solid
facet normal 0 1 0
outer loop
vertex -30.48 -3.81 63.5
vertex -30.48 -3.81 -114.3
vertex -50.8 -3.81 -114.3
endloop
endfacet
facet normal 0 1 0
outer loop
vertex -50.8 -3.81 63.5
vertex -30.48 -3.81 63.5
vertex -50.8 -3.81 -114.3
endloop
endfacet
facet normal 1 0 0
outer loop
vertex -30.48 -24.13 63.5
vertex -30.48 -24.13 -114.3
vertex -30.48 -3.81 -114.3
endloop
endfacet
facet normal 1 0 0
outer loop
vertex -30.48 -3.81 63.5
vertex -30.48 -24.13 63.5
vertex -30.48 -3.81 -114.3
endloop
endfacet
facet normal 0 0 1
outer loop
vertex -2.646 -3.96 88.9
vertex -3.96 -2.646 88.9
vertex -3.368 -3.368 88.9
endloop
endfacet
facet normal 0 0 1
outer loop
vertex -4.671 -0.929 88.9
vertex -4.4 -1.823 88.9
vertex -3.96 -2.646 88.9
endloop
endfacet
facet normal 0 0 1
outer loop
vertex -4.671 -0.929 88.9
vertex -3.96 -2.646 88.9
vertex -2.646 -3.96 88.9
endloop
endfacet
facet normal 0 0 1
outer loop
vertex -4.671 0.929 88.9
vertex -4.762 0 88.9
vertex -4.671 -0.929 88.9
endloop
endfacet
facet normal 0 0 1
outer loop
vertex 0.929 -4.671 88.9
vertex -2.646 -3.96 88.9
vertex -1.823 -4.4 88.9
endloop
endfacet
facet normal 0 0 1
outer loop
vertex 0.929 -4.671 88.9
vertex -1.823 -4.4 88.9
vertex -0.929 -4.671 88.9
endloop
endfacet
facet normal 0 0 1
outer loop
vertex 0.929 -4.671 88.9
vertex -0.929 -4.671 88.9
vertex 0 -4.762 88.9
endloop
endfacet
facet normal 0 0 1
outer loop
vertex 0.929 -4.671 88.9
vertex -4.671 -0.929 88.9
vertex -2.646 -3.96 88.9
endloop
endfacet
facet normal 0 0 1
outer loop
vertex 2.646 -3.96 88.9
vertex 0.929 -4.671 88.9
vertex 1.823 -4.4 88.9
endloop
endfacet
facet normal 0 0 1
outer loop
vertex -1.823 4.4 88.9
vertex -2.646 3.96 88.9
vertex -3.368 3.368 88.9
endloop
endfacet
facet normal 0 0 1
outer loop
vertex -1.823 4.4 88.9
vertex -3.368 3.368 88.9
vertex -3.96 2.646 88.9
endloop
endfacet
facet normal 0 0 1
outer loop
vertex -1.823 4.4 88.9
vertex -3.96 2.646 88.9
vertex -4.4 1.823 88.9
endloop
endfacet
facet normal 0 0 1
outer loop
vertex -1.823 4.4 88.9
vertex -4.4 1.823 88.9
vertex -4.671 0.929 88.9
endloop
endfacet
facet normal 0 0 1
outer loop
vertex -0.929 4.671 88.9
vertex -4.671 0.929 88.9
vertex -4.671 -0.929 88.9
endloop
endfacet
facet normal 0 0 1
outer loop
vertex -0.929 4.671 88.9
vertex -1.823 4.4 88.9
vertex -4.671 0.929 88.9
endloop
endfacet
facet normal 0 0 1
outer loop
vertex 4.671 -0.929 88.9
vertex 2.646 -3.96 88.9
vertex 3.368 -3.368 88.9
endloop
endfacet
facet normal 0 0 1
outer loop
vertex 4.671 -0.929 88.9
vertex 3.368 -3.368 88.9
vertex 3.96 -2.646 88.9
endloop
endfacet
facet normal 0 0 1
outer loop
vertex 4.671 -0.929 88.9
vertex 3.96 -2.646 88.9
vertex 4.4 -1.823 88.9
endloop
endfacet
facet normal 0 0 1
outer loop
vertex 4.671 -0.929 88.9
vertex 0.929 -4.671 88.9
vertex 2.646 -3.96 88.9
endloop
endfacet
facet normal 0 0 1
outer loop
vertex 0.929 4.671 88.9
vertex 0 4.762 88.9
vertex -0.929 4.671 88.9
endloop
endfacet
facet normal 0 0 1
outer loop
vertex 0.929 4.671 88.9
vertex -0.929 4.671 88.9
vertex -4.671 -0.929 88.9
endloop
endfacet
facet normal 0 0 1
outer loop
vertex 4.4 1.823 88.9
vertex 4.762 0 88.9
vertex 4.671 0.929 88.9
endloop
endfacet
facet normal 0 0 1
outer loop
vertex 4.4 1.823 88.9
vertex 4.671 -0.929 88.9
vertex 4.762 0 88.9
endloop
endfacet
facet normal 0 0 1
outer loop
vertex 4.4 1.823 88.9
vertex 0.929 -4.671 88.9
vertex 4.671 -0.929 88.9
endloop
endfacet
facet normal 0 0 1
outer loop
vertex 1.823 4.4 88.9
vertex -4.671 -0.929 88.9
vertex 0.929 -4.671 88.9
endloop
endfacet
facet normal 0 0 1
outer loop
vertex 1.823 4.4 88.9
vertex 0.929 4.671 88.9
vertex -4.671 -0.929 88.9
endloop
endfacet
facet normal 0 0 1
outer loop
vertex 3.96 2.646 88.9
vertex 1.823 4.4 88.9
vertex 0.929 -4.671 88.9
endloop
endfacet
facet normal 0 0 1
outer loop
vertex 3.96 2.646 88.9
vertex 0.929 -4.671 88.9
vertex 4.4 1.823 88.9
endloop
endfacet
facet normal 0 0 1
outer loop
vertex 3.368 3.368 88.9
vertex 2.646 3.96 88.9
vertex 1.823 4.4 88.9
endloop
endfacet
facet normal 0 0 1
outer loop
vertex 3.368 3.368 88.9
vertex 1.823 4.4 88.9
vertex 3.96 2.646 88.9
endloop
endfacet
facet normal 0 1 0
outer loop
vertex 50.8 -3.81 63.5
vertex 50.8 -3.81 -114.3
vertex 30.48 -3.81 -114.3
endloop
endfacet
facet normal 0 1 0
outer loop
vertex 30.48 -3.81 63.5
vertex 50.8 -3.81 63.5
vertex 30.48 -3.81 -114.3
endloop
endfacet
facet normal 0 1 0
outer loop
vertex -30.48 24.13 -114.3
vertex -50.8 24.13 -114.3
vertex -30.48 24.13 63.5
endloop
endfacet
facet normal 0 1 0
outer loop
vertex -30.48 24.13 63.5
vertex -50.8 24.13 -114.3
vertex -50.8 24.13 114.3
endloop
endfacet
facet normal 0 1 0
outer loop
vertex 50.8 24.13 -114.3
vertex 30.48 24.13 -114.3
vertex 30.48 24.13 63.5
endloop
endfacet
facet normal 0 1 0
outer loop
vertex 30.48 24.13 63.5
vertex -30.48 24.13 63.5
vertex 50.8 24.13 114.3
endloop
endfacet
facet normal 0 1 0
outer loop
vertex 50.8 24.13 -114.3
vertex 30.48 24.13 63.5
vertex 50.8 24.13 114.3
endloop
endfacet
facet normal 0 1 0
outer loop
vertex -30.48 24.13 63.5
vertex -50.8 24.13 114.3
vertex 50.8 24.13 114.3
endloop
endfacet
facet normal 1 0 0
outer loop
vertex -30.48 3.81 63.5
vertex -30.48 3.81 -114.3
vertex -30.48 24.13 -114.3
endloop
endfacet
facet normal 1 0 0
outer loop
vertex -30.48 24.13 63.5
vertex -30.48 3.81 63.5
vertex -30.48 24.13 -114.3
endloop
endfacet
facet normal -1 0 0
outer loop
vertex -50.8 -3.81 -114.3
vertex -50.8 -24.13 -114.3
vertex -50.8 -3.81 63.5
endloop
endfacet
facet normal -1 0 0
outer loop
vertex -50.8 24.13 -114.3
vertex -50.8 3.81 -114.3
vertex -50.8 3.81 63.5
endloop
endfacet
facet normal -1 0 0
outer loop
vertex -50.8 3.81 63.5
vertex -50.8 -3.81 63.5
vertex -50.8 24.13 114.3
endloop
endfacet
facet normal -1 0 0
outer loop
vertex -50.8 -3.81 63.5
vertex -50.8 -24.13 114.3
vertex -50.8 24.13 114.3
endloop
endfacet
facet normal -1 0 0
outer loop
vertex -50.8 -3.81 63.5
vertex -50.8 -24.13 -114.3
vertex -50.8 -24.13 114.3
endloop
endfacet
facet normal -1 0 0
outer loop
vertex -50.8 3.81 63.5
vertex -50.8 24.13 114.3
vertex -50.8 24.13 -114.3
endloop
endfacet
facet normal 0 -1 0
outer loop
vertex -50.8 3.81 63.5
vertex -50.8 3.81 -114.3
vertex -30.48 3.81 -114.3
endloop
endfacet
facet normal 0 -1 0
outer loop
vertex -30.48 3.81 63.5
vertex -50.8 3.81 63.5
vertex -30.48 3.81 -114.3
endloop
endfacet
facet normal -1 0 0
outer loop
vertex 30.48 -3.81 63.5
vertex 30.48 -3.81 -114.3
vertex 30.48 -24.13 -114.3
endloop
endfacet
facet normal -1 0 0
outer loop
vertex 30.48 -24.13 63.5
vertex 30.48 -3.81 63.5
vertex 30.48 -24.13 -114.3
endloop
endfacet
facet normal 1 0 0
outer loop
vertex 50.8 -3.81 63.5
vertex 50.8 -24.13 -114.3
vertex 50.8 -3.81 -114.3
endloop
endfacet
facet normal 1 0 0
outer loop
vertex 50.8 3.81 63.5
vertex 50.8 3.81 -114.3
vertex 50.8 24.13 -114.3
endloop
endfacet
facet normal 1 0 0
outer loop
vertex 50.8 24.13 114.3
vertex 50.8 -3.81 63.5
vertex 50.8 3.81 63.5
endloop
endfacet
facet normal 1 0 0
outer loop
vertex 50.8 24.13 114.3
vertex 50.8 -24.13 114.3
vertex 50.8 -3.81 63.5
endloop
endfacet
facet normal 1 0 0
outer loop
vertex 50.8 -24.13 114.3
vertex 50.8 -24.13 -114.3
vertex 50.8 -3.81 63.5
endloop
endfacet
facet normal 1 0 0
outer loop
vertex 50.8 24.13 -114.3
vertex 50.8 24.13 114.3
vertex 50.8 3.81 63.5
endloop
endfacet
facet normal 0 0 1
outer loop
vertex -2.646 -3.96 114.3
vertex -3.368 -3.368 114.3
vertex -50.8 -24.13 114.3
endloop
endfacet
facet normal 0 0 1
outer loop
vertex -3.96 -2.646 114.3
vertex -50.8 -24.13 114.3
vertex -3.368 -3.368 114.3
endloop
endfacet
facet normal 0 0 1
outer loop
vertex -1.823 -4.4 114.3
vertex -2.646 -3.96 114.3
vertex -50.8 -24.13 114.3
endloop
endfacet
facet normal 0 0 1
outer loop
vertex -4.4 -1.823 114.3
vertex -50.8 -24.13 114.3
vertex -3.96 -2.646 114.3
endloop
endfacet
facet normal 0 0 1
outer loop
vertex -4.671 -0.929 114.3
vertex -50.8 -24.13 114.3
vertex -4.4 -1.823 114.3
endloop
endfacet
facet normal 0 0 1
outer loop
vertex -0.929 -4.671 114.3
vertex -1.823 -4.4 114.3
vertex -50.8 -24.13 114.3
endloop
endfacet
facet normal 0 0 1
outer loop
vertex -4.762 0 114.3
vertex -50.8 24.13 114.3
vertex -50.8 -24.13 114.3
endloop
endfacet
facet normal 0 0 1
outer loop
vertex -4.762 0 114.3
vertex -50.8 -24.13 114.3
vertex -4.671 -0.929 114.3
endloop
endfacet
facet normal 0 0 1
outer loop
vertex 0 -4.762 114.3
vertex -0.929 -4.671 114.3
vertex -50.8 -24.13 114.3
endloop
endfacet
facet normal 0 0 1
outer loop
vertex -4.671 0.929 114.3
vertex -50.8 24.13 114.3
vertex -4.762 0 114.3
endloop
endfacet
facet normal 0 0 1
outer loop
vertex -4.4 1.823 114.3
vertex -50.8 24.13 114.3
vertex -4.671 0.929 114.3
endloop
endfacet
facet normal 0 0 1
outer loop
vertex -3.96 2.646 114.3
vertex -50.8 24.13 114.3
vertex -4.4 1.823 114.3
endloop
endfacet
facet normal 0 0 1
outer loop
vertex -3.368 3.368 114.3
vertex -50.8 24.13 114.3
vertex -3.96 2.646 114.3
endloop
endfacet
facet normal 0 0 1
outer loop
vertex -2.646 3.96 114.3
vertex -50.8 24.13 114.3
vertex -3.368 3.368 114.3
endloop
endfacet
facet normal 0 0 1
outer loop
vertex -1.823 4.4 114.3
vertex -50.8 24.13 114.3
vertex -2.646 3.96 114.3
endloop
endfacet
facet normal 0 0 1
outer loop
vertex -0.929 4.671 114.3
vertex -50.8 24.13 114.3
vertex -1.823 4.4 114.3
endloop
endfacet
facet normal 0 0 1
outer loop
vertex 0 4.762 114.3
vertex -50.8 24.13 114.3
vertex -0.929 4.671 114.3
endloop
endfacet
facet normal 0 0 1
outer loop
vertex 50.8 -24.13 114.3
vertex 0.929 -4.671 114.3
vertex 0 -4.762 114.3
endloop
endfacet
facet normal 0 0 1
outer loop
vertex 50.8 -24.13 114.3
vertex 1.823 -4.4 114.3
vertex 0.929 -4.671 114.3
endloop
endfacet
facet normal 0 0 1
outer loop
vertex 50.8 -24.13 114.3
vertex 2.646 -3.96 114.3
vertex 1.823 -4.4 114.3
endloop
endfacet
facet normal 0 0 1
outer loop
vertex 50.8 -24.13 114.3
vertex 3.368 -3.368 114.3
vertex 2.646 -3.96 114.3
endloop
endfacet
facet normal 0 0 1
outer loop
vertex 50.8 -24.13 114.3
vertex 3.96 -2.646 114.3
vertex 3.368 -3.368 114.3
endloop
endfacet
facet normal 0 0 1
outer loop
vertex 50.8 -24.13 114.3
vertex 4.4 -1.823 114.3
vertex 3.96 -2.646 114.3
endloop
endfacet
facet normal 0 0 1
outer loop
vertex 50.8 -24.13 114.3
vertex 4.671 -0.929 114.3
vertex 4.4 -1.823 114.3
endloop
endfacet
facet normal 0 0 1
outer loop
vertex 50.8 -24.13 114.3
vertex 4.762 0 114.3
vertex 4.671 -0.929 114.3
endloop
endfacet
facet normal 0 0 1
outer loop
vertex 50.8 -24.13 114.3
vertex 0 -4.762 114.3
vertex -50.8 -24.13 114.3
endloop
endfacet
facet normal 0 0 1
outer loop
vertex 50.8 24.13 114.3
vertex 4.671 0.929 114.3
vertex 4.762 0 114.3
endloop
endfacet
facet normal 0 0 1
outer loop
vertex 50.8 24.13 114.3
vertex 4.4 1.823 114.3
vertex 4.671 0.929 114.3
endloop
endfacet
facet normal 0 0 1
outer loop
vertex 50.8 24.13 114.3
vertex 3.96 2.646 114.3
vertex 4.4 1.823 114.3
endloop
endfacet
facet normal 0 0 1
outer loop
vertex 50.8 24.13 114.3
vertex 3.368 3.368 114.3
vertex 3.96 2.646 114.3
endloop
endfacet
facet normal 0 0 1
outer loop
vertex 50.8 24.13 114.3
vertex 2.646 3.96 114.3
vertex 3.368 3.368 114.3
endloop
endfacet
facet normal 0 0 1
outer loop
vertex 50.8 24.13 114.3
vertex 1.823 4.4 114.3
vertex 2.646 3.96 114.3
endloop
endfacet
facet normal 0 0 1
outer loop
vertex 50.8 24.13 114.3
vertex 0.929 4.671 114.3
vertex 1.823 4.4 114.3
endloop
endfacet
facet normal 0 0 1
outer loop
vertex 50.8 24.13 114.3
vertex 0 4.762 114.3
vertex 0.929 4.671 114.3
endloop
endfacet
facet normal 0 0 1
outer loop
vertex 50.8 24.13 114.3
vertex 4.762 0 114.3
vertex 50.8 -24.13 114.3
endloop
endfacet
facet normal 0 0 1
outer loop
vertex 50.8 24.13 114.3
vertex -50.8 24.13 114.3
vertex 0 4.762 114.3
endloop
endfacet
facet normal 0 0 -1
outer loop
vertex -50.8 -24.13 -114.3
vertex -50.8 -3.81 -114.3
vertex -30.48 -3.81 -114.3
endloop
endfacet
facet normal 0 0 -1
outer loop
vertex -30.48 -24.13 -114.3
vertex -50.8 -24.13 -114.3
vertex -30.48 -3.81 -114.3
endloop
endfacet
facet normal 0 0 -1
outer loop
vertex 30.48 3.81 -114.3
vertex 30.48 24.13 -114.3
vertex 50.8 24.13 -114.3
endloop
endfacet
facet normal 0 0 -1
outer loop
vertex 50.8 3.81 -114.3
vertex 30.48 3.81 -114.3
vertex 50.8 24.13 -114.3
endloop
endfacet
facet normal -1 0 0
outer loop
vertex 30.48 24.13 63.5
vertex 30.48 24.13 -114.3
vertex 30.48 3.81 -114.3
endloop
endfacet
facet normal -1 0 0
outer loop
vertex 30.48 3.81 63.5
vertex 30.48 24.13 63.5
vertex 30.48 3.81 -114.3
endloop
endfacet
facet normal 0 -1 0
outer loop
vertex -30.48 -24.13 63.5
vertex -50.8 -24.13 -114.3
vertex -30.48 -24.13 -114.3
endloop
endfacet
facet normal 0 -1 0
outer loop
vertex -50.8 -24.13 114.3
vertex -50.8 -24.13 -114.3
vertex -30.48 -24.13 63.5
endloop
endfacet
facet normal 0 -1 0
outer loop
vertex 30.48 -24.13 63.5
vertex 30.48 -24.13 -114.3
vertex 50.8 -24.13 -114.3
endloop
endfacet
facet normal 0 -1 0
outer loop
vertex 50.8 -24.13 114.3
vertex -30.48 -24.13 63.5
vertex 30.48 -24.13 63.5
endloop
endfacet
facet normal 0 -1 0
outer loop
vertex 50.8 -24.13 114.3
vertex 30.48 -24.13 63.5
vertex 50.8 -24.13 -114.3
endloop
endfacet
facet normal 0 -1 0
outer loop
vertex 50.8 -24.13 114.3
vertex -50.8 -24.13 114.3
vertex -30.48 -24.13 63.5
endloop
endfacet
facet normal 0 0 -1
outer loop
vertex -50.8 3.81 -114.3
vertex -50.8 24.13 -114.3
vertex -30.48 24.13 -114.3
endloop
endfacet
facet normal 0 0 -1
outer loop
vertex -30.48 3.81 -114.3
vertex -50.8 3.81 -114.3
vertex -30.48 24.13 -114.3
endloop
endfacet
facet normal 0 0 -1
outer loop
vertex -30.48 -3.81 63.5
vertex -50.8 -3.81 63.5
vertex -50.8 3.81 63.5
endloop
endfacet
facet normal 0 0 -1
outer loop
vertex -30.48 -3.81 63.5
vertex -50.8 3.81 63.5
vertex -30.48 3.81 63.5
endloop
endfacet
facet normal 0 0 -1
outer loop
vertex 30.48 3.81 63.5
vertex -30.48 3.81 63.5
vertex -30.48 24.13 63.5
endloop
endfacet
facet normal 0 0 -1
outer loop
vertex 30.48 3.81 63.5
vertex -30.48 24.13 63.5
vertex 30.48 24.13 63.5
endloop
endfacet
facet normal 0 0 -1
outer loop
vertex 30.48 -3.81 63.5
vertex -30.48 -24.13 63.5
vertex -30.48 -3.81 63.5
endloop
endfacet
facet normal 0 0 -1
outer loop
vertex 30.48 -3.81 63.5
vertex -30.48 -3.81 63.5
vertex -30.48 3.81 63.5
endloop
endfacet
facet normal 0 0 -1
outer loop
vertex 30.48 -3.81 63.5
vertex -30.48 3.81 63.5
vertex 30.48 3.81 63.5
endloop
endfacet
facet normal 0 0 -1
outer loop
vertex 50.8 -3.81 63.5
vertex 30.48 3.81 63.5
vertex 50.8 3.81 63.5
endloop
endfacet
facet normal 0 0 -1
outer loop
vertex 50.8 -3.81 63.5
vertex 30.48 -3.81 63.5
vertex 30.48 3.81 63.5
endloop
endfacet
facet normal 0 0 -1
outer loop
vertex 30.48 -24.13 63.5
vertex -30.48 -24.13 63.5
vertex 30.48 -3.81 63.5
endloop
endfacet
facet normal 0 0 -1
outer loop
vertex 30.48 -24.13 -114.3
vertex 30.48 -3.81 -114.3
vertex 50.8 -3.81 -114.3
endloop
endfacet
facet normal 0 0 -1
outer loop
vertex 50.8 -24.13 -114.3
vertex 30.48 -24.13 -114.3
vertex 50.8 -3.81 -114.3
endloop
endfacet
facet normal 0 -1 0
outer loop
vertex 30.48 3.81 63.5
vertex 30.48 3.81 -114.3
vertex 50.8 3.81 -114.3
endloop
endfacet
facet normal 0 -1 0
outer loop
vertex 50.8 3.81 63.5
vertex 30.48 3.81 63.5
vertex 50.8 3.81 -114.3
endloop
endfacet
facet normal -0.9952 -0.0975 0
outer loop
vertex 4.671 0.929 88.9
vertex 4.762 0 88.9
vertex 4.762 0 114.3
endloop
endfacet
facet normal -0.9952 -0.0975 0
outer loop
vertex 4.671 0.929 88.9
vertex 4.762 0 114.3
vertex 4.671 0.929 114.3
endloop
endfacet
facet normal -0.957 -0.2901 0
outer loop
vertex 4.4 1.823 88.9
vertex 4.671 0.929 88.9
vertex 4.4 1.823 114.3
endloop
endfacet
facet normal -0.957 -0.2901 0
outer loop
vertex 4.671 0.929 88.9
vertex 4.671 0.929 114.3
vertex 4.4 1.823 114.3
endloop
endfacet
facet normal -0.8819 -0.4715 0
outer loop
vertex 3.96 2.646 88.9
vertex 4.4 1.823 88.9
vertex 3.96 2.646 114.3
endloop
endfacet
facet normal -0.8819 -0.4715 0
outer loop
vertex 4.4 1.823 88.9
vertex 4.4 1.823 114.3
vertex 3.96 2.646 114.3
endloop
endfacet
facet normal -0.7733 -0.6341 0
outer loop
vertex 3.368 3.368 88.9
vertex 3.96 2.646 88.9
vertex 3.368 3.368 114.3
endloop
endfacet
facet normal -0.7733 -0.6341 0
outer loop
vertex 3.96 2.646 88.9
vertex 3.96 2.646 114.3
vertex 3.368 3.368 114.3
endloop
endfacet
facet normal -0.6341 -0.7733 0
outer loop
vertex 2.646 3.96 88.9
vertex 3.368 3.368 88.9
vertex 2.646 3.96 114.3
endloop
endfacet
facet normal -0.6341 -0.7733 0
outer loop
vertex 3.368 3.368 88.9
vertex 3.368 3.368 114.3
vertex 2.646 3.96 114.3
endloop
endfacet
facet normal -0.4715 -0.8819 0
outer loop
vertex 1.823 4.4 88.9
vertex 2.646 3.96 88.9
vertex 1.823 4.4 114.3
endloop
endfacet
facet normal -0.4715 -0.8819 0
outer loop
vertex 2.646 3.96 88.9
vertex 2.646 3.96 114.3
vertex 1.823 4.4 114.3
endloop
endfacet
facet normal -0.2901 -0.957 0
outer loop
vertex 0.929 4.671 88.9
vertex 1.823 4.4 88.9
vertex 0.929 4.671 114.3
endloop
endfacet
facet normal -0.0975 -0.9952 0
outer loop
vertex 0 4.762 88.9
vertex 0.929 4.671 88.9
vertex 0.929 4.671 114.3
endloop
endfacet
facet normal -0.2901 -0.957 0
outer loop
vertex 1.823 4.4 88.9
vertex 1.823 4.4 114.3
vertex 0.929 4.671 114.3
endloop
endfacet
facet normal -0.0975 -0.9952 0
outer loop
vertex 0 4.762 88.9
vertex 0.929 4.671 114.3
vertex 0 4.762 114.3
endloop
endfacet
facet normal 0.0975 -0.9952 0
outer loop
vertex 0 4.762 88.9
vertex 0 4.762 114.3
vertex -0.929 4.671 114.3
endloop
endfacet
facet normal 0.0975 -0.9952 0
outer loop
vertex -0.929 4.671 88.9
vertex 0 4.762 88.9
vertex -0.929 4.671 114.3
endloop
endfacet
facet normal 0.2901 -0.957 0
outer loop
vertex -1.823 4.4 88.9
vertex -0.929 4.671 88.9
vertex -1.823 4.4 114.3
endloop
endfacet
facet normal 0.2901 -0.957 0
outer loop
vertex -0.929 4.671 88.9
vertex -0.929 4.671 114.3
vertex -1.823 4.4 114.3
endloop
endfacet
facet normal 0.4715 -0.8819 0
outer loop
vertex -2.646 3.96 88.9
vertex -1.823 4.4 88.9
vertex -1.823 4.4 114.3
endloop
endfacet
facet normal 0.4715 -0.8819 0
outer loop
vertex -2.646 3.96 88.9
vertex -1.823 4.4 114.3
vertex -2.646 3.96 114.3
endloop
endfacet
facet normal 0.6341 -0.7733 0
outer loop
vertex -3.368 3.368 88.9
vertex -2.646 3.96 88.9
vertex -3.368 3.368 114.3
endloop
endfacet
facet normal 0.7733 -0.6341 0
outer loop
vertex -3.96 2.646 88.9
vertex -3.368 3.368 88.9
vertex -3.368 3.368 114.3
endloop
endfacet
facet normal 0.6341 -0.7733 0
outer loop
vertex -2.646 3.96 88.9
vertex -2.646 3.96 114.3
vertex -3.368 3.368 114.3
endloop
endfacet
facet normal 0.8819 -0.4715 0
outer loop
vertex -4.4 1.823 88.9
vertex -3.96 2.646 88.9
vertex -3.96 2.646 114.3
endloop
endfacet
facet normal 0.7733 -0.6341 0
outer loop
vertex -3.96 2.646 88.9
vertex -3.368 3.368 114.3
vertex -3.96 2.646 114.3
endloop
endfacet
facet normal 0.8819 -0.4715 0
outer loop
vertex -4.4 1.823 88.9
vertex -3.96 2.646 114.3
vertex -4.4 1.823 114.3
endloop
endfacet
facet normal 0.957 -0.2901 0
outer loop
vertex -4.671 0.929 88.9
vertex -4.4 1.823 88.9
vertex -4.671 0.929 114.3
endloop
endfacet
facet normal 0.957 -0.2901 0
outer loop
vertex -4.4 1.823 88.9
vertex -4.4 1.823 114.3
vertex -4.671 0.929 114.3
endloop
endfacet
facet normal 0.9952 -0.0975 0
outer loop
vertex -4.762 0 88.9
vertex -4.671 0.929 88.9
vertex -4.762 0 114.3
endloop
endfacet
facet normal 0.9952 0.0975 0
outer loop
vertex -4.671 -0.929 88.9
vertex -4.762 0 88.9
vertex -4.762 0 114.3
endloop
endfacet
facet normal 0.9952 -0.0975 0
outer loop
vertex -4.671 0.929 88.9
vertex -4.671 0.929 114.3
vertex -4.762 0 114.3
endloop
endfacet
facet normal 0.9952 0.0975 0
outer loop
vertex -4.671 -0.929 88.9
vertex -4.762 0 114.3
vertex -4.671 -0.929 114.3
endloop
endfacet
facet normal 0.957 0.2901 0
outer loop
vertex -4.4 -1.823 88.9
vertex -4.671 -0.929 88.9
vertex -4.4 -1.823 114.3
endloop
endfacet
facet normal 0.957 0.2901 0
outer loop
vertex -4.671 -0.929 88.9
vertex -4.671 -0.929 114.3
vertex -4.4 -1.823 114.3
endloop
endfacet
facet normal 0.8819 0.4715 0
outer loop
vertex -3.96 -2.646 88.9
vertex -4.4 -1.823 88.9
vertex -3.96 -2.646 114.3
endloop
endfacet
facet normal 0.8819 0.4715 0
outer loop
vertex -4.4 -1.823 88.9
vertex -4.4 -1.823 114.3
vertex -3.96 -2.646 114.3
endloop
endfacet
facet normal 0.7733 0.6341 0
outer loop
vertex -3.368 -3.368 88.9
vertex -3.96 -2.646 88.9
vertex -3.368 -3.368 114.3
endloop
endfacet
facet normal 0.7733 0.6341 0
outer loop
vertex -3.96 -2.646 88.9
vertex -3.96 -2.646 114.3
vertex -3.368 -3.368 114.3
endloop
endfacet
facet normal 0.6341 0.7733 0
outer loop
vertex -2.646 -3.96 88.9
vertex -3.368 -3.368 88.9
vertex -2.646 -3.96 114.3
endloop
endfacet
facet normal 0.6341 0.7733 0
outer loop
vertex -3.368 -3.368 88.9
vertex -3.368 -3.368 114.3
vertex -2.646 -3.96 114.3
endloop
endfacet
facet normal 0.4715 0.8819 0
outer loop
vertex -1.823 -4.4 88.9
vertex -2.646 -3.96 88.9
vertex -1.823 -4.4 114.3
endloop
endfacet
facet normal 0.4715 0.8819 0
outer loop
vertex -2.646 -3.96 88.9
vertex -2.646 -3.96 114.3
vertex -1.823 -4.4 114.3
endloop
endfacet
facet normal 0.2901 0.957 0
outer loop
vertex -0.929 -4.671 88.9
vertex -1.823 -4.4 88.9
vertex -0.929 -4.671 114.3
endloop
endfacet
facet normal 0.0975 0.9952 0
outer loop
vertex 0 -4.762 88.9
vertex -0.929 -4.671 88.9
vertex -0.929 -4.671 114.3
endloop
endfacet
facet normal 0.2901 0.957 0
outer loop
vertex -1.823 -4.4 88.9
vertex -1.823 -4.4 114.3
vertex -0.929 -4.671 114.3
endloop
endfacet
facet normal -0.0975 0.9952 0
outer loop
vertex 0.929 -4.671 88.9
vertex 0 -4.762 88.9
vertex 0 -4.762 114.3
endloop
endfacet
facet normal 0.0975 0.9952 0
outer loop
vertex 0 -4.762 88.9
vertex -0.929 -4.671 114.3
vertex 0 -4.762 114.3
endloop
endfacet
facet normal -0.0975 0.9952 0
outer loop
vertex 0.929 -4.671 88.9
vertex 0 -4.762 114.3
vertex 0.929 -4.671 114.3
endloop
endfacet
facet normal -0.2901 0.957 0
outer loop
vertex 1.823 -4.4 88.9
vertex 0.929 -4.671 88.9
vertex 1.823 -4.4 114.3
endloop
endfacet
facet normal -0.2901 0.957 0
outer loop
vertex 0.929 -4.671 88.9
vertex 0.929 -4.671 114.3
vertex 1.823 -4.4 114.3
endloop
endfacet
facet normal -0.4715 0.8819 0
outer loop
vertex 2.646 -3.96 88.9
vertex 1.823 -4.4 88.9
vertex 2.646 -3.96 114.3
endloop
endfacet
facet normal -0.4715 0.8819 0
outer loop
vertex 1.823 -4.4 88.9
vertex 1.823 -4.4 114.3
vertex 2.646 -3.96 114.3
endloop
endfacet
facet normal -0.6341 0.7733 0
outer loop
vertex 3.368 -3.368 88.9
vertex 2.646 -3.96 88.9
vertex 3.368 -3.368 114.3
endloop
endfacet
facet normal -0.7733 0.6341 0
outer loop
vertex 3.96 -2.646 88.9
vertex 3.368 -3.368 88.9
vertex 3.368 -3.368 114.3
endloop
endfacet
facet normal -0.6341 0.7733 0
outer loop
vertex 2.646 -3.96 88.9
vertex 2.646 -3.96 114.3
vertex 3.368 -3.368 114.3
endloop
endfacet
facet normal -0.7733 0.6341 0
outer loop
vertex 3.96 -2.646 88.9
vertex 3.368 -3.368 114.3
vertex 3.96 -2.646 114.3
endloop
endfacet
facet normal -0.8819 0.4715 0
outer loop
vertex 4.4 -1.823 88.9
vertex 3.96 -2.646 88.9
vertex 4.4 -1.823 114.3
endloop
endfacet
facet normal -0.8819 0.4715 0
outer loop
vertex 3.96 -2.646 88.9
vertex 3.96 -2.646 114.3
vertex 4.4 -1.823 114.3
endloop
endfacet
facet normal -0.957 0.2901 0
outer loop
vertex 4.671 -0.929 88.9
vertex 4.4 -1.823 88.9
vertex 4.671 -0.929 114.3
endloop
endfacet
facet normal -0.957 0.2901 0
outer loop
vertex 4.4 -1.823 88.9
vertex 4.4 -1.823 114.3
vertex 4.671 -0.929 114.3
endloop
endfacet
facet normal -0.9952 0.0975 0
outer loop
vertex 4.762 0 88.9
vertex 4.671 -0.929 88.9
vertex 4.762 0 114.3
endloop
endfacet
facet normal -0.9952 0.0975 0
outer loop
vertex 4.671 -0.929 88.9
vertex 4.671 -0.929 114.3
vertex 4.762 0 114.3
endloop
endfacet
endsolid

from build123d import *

# Parameters (mm, degrees)
F0_W     = 101.6
F0_H     = 48.26
F1_DEPTH = 114.3
F3_DEPTH = 177.8
F4_R     = 4.7625
F5_DEPTH = 25.4


with BuildPart() as f1:
    # F0 (on Top) → F1 (new body, symmetric)
    with BuildSketch(Plane.XY):
        Rectangle(F0_W, F0_H)
    extrude(amount=F1_DEPTH, both=True)

    # F2 (on face) → F3 (cut)
    with BuildSketch(Plane(origin=(0, 0, -114.3), x_dir=(1, 0, 0), z_dir=(0, 0, -1))):
        Polygon((30.48, 24.13), (-30.48, 24.13), (-30.48, 3.81), (-50.8, 3.81), (-50.8, -3.81), (-30.48, -3.81), (-30.48, -24.13), (30.48, -24.13), (30.48, -3.81), (50.8, -3.81), (50.8, 3.81), (30.48, 3.81), align=None)
    extrude(amount=-F3_DEPTH, mode=Mode.SUBTRACT)

    # F4 (on face) → F5 (cut)
    with BuildSketch(Plane.XY.offset(114.3)):
        Circle(F4_R)
    extrude(amount=-F5_DEPTH, mode=Mode.SUBTRACT)


solid = f1.part
